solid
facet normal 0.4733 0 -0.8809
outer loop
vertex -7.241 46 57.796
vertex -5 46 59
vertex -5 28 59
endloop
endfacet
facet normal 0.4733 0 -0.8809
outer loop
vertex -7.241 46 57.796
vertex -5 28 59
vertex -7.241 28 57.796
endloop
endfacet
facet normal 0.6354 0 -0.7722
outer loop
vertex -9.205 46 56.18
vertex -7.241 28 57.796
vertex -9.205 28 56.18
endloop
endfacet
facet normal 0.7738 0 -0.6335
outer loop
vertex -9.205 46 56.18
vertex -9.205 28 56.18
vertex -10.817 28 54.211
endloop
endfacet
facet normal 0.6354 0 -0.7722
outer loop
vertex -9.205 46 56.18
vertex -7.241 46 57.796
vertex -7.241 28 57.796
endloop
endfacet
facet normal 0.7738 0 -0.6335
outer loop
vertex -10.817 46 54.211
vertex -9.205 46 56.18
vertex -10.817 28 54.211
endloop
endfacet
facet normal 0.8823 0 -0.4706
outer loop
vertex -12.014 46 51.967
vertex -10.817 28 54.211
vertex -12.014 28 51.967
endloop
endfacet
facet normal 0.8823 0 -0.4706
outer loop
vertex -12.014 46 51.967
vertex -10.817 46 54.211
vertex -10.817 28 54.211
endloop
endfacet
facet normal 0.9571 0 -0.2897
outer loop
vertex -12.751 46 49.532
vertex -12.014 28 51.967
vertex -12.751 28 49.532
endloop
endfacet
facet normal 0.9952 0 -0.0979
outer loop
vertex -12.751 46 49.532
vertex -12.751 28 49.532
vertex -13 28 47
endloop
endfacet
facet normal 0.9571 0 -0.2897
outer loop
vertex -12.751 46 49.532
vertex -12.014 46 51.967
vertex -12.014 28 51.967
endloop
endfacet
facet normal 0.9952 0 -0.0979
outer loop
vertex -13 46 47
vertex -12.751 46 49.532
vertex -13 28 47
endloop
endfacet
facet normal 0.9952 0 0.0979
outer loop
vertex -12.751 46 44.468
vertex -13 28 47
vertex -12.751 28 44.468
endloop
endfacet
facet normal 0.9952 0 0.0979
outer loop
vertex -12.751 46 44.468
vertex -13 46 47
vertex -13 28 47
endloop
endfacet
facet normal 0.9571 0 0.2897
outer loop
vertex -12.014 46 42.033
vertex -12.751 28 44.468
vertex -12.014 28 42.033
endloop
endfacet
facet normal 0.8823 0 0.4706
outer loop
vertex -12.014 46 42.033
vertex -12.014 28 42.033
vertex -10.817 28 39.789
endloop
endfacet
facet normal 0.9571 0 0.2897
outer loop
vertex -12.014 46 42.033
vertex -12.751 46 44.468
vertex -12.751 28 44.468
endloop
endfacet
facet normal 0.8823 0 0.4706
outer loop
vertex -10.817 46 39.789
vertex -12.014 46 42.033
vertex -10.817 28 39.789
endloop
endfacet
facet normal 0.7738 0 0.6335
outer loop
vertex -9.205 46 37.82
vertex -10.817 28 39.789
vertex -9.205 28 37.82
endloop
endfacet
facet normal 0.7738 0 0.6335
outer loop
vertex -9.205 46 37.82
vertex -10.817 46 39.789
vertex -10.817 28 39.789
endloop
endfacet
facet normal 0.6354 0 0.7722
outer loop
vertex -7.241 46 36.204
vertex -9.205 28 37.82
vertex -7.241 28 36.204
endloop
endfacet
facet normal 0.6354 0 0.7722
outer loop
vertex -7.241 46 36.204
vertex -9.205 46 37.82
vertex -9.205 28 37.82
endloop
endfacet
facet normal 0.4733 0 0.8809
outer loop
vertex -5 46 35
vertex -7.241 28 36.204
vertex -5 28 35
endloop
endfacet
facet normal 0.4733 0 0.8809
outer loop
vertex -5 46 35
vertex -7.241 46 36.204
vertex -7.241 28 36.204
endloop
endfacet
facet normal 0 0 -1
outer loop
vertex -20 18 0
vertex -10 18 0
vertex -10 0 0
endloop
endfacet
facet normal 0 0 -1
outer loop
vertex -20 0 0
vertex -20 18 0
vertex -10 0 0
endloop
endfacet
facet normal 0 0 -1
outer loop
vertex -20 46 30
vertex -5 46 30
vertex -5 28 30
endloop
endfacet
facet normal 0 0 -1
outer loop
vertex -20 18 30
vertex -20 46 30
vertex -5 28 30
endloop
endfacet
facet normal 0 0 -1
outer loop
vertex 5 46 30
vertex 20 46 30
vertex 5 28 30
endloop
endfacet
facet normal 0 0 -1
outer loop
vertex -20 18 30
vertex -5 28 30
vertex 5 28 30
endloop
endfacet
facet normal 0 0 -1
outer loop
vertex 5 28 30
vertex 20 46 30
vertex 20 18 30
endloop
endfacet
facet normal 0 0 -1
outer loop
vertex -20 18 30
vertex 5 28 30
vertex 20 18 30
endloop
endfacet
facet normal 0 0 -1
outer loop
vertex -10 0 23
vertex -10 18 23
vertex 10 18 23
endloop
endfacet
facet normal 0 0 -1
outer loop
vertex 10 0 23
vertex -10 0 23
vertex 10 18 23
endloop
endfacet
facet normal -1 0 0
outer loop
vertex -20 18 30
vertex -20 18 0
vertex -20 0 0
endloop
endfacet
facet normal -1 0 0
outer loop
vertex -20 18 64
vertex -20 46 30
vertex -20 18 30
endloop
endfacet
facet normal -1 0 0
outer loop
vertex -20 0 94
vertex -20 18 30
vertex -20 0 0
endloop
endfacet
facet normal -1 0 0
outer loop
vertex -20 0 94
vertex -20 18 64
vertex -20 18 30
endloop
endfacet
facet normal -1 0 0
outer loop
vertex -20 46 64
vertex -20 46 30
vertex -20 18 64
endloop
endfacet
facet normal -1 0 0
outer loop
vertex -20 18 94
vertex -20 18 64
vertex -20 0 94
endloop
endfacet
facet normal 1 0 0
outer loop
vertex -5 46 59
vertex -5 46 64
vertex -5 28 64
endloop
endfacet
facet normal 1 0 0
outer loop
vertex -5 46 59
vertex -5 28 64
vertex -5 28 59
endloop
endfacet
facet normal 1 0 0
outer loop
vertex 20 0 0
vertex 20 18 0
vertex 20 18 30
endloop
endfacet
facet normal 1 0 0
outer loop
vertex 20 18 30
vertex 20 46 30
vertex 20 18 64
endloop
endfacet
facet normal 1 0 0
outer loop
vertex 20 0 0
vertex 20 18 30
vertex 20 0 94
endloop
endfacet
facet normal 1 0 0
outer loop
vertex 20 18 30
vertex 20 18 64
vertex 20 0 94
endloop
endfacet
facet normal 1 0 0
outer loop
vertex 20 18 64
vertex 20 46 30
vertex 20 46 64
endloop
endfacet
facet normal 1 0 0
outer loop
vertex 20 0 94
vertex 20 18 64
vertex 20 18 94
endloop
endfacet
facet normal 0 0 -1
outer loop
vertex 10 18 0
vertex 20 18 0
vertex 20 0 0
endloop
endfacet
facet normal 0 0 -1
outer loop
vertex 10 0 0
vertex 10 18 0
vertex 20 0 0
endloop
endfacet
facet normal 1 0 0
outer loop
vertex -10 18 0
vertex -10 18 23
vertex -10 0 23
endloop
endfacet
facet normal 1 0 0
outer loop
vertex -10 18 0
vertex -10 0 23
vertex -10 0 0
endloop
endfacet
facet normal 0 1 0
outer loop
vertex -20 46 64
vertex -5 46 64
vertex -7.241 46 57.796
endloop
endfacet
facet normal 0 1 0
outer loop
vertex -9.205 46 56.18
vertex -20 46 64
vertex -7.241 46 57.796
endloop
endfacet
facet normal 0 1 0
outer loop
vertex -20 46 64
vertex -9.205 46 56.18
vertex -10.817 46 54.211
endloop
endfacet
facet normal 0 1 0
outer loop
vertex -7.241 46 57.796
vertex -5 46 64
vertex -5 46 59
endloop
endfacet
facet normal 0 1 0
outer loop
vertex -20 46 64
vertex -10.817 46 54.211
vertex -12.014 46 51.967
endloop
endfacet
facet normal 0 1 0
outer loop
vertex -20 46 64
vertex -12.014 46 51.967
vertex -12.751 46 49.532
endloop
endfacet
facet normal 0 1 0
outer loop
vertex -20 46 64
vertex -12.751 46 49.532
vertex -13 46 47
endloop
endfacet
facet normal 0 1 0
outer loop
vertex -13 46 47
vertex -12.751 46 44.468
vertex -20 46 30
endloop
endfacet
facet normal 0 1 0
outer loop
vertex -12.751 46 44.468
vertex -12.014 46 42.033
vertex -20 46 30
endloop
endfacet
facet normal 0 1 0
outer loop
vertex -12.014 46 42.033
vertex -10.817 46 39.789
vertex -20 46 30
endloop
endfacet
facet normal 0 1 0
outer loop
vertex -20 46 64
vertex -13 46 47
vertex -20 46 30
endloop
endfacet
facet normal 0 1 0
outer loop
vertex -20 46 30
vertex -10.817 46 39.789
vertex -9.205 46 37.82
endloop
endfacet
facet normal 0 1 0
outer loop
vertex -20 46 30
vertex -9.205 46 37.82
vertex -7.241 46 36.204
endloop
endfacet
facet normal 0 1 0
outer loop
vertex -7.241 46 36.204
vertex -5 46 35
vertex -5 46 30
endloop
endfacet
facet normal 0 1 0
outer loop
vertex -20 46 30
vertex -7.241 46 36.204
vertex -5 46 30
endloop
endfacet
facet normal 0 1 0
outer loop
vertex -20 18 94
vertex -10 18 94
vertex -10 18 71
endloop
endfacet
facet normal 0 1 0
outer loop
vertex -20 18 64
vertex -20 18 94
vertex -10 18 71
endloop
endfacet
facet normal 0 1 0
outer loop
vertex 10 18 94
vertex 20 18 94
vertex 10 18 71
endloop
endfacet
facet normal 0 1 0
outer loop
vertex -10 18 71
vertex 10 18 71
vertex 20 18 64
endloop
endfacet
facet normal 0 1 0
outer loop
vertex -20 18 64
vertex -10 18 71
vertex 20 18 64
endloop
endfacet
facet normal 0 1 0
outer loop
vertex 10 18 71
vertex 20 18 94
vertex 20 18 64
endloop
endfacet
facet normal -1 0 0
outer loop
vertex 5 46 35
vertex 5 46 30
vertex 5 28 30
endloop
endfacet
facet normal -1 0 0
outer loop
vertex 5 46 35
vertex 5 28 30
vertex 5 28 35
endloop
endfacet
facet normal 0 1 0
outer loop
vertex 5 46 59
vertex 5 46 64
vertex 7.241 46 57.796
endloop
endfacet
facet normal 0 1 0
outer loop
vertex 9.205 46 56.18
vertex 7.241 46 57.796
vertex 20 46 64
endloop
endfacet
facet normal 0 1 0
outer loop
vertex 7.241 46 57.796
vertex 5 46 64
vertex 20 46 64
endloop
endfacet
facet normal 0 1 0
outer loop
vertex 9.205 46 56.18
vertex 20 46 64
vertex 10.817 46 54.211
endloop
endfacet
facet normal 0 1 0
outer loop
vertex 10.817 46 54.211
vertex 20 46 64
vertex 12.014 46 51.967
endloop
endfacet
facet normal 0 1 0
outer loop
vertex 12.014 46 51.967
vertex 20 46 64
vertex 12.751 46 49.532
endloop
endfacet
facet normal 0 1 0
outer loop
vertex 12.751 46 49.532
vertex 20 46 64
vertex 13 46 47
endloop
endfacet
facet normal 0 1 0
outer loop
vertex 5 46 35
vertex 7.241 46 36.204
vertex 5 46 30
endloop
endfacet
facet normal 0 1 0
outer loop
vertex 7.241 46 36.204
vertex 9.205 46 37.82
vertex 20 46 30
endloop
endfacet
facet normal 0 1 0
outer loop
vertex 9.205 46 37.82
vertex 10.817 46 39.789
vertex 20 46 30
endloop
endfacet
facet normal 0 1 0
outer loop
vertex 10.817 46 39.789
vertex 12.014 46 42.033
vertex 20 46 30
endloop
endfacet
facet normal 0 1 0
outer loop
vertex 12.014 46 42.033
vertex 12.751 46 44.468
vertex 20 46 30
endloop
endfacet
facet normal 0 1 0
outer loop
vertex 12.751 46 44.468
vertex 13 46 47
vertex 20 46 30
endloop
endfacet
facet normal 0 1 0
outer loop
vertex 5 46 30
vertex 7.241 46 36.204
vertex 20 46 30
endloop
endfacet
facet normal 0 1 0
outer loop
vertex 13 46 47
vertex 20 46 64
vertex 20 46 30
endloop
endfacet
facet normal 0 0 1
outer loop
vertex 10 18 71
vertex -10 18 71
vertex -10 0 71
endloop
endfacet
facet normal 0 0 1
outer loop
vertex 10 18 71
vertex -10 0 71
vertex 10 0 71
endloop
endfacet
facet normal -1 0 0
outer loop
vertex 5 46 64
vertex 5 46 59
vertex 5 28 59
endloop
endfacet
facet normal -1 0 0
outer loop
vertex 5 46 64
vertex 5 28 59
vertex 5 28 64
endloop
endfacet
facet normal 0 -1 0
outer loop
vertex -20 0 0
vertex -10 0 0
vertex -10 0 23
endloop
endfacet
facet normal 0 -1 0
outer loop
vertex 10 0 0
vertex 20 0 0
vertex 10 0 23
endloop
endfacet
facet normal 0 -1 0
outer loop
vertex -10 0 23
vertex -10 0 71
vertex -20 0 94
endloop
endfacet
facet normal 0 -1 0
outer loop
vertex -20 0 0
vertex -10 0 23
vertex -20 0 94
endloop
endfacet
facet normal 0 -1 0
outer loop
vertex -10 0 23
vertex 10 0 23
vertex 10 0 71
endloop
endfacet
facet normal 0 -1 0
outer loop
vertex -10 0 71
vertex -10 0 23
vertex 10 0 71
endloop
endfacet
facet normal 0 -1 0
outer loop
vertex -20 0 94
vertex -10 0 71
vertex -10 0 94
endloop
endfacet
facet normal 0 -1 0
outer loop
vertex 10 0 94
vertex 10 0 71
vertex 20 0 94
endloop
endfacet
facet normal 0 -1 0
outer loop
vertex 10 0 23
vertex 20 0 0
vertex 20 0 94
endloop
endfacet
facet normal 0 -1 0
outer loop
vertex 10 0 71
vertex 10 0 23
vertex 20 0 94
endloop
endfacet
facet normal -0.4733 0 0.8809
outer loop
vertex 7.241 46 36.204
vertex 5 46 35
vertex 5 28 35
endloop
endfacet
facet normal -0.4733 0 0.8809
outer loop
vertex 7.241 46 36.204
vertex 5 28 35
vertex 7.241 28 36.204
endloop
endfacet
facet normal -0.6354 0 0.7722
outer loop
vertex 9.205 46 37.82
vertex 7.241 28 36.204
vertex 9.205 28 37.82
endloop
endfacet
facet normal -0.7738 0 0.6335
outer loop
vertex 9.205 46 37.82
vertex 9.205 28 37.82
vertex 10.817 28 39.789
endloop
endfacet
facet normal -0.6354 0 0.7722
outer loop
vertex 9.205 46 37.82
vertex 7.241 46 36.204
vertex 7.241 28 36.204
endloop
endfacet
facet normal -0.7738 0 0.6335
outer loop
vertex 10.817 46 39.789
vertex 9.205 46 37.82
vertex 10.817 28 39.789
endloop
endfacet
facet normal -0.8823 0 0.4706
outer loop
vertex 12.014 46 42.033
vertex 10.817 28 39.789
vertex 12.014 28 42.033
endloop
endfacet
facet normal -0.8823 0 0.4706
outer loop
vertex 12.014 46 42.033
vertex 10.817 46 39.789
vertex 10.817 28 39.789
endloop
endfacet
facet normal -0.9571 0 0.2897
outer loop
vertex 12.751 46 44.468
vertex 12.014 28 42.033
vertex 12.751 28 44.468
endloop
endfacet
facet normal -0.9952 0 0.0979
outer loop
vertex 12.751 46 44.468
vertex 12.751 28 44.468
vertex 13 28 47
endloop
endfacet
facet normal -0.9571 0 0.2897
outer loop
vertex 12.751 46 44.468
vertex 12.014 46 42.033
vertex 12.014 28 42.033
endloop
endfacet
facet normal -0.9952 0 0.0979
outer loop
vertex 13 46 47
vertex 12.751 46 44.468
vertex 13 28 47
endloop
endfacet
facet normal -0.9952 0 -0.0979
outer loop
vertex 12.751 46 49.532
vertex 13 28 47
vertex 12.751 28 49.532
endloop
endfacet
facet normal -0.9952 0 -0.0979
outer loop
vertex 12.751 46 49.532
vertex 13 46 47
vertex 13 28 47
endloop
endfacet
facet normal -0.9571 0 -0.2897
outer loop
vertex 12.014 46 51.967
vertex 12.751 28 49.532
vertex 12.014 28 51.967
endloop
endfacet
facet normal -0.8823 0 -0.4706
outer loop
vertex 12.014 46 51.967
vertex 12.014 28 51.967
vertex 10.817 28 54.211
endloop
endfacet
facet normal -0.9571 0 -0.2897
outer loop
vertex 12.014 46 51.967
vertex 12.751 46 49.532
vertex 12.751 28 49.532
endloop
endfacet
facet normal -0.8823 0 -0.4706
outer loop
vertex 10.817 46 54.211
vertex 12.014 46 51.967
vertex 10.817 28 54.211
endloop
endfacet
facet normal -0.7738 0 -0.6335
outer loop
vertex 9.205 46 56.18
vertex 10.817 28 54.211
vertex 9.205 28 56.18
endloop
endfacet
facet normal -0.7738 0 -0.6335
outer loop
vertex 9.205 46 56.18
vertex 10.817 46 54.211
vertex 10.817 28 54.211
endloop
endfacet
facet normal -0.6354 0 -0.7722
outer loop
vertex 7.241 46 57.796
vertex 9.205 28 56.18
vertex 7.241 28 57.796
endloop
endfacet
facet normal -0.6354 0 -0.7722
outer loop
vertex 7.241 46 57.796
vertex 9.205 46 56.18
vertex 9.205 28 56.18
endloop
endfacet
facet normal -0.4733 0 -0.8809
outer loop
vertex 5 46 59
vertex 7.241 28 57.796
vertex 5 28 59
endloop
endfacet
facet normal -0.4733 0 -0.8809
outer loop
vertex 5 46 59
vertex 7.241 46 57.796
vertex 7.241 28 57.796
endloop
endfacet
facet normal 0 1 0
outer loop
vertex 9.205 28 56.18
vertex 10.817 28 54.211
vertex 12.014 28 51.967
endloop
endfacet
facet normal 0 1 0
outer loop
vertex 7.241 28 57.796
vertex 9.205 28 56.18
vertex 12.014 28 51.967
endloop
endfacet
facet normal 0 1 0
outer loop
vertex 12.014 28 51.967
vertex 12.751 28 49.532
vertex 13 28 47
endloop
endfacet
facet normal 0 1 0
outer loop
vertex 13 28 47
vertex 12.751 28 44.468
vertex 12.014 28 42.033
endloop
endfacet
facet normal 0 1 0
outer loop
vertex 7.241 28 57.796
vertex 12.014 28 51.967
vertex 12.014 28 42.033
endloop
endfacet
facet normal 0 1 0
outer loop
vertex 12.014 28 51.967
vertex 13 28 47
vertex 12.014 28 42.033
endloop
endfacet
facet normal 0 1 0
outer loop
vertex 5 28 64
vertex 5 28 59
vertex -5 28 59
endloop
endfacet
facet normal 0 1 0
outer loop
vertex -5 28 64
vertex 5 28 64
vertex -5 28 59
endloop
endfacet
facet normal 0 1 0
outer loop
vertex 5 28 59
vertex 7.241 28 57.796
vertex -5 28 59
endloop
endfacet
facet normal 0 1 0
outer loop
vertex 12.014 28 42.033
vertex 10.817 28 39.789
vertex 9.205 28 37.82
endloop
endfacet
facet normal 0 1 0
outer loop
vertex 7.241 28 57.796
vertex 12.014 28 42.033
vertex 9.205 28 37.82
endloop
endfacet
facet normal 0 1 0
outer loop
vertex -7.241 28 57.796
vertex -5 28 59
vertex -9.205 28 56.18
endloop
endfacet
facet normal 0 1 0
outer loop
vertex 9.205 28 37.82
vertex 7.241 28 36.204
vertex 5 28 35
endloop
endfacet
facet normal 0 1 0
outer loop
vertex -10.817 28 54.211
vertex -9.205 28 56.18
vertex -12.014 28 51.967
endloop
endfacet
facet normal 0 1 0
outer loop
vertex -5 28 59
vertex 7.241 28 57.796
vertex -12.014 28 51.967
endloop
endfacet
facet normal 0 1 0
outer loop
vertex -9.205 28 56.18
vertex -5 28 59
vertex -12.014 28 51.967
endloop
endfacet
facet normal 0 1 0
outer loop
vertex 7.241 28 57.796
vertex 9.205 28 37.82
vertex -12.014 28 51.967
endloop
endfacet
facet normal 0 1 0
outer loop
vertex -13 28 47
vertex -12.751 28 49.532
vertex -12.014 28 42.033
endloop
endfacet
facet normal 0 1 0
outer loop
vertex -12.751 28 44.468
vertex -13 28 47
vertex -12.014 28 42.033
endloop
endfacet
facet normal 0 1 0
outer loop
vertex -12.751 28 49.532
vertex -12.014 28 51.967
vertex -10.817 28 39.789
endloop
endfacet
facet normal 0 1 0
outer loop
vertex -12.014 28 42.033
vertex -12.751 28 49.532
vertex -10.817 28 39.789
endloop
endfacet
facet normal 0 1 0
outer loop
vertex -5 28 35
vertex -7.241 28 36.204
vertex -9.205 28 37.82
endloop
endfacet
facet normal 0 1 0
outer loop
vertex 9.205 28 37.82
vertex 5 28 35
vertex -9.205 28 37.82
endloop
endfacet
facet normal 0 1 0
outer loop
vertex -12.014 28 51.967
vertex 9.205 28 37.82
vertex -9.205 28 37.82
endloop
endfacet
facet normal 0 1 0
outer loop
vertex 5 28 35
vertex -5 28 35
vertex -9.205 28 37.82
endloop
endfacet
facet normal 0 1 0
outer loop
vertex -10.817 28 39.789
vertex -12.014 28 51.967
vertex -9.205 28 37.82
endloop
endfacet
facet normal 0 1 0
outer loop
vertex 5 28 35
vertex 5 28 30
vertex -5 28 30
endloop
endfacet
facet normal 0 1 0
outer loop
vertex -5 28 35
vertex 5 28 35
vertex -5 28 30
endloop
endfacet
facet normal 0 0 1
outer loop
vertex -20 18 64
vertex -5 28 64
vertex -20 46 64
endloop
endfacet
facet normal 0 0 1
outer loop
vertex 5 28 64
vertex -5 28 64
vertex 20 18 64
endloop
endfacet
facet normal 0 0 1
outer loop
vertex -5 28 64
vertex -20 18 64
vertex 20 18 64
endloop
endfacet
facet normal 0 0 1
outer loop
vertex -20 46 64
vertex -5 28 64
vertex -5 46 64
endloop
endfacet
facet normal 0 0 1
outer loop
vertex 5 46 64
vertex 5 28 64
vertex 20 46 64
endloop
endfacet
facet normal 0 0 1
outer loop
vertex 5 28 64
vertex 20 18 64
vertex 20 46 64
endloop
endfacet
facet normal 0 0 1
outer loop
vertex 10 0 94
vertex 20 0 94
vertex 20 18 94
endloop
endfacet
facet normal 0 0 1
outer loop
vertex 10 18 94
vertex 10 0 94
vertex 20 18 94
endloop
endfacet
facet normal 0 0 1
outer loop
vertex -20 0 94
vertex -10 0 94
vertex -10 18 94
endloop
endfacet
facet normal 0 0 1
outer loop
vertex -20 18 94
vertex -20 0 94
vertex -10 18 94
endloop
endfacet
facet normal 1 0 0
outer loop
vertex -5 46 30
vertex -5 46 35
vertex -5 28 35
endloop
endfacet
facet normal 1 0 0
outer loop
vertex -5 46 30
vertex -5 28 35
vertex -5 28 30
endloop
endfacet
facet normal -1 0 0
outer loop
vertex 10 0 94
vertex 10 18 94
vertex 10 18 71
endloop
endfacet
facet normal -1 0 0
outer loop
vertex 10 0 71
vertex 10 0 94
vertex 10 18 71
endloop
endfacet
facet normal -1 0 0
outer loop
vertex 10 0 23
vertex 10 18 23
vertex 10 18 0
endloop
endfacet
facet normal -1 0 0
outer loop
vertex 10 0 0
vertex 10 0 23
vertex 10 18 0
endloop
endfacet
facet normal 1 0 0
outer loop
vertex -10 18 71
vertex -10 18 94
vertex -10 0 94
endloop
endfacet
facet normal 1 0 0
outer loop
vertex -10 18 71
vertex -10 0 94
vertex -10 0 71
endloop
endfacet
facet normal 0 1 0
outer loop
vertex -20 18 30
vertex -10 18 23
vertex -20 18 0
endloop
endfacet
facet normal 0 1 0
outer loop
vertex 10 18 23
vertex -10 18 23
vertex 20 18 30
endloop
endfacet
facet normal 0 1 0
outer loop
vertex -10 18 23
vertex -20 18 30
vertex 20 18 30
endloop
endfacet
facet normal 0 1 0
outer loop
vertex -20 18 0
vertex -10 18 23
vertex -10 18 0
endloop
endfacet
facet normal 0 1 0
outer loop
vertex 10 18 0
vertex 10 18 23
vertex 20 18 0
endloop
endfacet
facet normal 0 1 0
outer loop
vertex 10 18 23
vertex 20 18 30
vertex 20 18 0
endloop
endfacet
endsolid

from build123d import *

# Parameters (mm, degrees)
SALIENTE_EXTRUIR1_DEPTH = 20
CROQUIS2_W              = 20
CROQUIS2_H              = 23
CORTAR_EXTRUIR1_DEPTH   = 101.09995005
CORTAR_EXTRUIR3_DEPTH   = 18


with BuildPart() as part:
    # Croquis1 → Saliente-Extruir1 (new, symmetric)
    with BuildSketch(Plane(origin=(0, 0, 0), x_dir=(0, 0, -1), z_dir=(1, 0, 0))):
        Polygon((0, 0), (-94, 0), (-94, 18), (-64, 18), (-64, 46), (-30, 46), (-30, 18), (0, 18), align=None)
    extrude(amount=SALIENTE_EXTRUIR1_DEPTH, both=True)

    # Croquis2 → Cortar-Extruir1 (cut, through all)
    with BuildSketch(Plane(origin=(0, 18, 0), x_dir=(1, 0, 0), z_dir=(0, 1, 0))):
        with Locations((0, -82.5)):
            Rectangle(CROQUIS2_W, CROQUIS2_H)
        with Locations((0, -11.5)):
            Rectangle(CROQUIS2_W, CROQUIS2_H)
    extrude(amount=-CORTAR_EXTRUIR1_DEPTH, mode=Mode.SUBTRACT)

    # Croquis3 → Cortar-Extruir3 (cut)
    with BuildSketch(Plane(origin=(0, 46, 0), x_dir=(1, 0, 0), z_dir=(0, 1, 0))):
        with BuildLine():
            Line((5, -59), (5, -64))
            Line((5, -64), (-5, -64))
            Line((-5, -64), (-5, -59))
            ThreePointArc((-5, -59), (-13, -47), (-5, -35))
            Line((-5, -35), (-5, -30))
            Line((-5, -30), (5, -30))
            Line((5, -30), (5, -35))
            ThreePointArc((5, -35), (13, -47), (5, -59))
        make_face()
    extrude(amount=-CORTAR_EXTRUIR3_DEPTH, mode=Mode.SUBTRACT)


solid = part.part
